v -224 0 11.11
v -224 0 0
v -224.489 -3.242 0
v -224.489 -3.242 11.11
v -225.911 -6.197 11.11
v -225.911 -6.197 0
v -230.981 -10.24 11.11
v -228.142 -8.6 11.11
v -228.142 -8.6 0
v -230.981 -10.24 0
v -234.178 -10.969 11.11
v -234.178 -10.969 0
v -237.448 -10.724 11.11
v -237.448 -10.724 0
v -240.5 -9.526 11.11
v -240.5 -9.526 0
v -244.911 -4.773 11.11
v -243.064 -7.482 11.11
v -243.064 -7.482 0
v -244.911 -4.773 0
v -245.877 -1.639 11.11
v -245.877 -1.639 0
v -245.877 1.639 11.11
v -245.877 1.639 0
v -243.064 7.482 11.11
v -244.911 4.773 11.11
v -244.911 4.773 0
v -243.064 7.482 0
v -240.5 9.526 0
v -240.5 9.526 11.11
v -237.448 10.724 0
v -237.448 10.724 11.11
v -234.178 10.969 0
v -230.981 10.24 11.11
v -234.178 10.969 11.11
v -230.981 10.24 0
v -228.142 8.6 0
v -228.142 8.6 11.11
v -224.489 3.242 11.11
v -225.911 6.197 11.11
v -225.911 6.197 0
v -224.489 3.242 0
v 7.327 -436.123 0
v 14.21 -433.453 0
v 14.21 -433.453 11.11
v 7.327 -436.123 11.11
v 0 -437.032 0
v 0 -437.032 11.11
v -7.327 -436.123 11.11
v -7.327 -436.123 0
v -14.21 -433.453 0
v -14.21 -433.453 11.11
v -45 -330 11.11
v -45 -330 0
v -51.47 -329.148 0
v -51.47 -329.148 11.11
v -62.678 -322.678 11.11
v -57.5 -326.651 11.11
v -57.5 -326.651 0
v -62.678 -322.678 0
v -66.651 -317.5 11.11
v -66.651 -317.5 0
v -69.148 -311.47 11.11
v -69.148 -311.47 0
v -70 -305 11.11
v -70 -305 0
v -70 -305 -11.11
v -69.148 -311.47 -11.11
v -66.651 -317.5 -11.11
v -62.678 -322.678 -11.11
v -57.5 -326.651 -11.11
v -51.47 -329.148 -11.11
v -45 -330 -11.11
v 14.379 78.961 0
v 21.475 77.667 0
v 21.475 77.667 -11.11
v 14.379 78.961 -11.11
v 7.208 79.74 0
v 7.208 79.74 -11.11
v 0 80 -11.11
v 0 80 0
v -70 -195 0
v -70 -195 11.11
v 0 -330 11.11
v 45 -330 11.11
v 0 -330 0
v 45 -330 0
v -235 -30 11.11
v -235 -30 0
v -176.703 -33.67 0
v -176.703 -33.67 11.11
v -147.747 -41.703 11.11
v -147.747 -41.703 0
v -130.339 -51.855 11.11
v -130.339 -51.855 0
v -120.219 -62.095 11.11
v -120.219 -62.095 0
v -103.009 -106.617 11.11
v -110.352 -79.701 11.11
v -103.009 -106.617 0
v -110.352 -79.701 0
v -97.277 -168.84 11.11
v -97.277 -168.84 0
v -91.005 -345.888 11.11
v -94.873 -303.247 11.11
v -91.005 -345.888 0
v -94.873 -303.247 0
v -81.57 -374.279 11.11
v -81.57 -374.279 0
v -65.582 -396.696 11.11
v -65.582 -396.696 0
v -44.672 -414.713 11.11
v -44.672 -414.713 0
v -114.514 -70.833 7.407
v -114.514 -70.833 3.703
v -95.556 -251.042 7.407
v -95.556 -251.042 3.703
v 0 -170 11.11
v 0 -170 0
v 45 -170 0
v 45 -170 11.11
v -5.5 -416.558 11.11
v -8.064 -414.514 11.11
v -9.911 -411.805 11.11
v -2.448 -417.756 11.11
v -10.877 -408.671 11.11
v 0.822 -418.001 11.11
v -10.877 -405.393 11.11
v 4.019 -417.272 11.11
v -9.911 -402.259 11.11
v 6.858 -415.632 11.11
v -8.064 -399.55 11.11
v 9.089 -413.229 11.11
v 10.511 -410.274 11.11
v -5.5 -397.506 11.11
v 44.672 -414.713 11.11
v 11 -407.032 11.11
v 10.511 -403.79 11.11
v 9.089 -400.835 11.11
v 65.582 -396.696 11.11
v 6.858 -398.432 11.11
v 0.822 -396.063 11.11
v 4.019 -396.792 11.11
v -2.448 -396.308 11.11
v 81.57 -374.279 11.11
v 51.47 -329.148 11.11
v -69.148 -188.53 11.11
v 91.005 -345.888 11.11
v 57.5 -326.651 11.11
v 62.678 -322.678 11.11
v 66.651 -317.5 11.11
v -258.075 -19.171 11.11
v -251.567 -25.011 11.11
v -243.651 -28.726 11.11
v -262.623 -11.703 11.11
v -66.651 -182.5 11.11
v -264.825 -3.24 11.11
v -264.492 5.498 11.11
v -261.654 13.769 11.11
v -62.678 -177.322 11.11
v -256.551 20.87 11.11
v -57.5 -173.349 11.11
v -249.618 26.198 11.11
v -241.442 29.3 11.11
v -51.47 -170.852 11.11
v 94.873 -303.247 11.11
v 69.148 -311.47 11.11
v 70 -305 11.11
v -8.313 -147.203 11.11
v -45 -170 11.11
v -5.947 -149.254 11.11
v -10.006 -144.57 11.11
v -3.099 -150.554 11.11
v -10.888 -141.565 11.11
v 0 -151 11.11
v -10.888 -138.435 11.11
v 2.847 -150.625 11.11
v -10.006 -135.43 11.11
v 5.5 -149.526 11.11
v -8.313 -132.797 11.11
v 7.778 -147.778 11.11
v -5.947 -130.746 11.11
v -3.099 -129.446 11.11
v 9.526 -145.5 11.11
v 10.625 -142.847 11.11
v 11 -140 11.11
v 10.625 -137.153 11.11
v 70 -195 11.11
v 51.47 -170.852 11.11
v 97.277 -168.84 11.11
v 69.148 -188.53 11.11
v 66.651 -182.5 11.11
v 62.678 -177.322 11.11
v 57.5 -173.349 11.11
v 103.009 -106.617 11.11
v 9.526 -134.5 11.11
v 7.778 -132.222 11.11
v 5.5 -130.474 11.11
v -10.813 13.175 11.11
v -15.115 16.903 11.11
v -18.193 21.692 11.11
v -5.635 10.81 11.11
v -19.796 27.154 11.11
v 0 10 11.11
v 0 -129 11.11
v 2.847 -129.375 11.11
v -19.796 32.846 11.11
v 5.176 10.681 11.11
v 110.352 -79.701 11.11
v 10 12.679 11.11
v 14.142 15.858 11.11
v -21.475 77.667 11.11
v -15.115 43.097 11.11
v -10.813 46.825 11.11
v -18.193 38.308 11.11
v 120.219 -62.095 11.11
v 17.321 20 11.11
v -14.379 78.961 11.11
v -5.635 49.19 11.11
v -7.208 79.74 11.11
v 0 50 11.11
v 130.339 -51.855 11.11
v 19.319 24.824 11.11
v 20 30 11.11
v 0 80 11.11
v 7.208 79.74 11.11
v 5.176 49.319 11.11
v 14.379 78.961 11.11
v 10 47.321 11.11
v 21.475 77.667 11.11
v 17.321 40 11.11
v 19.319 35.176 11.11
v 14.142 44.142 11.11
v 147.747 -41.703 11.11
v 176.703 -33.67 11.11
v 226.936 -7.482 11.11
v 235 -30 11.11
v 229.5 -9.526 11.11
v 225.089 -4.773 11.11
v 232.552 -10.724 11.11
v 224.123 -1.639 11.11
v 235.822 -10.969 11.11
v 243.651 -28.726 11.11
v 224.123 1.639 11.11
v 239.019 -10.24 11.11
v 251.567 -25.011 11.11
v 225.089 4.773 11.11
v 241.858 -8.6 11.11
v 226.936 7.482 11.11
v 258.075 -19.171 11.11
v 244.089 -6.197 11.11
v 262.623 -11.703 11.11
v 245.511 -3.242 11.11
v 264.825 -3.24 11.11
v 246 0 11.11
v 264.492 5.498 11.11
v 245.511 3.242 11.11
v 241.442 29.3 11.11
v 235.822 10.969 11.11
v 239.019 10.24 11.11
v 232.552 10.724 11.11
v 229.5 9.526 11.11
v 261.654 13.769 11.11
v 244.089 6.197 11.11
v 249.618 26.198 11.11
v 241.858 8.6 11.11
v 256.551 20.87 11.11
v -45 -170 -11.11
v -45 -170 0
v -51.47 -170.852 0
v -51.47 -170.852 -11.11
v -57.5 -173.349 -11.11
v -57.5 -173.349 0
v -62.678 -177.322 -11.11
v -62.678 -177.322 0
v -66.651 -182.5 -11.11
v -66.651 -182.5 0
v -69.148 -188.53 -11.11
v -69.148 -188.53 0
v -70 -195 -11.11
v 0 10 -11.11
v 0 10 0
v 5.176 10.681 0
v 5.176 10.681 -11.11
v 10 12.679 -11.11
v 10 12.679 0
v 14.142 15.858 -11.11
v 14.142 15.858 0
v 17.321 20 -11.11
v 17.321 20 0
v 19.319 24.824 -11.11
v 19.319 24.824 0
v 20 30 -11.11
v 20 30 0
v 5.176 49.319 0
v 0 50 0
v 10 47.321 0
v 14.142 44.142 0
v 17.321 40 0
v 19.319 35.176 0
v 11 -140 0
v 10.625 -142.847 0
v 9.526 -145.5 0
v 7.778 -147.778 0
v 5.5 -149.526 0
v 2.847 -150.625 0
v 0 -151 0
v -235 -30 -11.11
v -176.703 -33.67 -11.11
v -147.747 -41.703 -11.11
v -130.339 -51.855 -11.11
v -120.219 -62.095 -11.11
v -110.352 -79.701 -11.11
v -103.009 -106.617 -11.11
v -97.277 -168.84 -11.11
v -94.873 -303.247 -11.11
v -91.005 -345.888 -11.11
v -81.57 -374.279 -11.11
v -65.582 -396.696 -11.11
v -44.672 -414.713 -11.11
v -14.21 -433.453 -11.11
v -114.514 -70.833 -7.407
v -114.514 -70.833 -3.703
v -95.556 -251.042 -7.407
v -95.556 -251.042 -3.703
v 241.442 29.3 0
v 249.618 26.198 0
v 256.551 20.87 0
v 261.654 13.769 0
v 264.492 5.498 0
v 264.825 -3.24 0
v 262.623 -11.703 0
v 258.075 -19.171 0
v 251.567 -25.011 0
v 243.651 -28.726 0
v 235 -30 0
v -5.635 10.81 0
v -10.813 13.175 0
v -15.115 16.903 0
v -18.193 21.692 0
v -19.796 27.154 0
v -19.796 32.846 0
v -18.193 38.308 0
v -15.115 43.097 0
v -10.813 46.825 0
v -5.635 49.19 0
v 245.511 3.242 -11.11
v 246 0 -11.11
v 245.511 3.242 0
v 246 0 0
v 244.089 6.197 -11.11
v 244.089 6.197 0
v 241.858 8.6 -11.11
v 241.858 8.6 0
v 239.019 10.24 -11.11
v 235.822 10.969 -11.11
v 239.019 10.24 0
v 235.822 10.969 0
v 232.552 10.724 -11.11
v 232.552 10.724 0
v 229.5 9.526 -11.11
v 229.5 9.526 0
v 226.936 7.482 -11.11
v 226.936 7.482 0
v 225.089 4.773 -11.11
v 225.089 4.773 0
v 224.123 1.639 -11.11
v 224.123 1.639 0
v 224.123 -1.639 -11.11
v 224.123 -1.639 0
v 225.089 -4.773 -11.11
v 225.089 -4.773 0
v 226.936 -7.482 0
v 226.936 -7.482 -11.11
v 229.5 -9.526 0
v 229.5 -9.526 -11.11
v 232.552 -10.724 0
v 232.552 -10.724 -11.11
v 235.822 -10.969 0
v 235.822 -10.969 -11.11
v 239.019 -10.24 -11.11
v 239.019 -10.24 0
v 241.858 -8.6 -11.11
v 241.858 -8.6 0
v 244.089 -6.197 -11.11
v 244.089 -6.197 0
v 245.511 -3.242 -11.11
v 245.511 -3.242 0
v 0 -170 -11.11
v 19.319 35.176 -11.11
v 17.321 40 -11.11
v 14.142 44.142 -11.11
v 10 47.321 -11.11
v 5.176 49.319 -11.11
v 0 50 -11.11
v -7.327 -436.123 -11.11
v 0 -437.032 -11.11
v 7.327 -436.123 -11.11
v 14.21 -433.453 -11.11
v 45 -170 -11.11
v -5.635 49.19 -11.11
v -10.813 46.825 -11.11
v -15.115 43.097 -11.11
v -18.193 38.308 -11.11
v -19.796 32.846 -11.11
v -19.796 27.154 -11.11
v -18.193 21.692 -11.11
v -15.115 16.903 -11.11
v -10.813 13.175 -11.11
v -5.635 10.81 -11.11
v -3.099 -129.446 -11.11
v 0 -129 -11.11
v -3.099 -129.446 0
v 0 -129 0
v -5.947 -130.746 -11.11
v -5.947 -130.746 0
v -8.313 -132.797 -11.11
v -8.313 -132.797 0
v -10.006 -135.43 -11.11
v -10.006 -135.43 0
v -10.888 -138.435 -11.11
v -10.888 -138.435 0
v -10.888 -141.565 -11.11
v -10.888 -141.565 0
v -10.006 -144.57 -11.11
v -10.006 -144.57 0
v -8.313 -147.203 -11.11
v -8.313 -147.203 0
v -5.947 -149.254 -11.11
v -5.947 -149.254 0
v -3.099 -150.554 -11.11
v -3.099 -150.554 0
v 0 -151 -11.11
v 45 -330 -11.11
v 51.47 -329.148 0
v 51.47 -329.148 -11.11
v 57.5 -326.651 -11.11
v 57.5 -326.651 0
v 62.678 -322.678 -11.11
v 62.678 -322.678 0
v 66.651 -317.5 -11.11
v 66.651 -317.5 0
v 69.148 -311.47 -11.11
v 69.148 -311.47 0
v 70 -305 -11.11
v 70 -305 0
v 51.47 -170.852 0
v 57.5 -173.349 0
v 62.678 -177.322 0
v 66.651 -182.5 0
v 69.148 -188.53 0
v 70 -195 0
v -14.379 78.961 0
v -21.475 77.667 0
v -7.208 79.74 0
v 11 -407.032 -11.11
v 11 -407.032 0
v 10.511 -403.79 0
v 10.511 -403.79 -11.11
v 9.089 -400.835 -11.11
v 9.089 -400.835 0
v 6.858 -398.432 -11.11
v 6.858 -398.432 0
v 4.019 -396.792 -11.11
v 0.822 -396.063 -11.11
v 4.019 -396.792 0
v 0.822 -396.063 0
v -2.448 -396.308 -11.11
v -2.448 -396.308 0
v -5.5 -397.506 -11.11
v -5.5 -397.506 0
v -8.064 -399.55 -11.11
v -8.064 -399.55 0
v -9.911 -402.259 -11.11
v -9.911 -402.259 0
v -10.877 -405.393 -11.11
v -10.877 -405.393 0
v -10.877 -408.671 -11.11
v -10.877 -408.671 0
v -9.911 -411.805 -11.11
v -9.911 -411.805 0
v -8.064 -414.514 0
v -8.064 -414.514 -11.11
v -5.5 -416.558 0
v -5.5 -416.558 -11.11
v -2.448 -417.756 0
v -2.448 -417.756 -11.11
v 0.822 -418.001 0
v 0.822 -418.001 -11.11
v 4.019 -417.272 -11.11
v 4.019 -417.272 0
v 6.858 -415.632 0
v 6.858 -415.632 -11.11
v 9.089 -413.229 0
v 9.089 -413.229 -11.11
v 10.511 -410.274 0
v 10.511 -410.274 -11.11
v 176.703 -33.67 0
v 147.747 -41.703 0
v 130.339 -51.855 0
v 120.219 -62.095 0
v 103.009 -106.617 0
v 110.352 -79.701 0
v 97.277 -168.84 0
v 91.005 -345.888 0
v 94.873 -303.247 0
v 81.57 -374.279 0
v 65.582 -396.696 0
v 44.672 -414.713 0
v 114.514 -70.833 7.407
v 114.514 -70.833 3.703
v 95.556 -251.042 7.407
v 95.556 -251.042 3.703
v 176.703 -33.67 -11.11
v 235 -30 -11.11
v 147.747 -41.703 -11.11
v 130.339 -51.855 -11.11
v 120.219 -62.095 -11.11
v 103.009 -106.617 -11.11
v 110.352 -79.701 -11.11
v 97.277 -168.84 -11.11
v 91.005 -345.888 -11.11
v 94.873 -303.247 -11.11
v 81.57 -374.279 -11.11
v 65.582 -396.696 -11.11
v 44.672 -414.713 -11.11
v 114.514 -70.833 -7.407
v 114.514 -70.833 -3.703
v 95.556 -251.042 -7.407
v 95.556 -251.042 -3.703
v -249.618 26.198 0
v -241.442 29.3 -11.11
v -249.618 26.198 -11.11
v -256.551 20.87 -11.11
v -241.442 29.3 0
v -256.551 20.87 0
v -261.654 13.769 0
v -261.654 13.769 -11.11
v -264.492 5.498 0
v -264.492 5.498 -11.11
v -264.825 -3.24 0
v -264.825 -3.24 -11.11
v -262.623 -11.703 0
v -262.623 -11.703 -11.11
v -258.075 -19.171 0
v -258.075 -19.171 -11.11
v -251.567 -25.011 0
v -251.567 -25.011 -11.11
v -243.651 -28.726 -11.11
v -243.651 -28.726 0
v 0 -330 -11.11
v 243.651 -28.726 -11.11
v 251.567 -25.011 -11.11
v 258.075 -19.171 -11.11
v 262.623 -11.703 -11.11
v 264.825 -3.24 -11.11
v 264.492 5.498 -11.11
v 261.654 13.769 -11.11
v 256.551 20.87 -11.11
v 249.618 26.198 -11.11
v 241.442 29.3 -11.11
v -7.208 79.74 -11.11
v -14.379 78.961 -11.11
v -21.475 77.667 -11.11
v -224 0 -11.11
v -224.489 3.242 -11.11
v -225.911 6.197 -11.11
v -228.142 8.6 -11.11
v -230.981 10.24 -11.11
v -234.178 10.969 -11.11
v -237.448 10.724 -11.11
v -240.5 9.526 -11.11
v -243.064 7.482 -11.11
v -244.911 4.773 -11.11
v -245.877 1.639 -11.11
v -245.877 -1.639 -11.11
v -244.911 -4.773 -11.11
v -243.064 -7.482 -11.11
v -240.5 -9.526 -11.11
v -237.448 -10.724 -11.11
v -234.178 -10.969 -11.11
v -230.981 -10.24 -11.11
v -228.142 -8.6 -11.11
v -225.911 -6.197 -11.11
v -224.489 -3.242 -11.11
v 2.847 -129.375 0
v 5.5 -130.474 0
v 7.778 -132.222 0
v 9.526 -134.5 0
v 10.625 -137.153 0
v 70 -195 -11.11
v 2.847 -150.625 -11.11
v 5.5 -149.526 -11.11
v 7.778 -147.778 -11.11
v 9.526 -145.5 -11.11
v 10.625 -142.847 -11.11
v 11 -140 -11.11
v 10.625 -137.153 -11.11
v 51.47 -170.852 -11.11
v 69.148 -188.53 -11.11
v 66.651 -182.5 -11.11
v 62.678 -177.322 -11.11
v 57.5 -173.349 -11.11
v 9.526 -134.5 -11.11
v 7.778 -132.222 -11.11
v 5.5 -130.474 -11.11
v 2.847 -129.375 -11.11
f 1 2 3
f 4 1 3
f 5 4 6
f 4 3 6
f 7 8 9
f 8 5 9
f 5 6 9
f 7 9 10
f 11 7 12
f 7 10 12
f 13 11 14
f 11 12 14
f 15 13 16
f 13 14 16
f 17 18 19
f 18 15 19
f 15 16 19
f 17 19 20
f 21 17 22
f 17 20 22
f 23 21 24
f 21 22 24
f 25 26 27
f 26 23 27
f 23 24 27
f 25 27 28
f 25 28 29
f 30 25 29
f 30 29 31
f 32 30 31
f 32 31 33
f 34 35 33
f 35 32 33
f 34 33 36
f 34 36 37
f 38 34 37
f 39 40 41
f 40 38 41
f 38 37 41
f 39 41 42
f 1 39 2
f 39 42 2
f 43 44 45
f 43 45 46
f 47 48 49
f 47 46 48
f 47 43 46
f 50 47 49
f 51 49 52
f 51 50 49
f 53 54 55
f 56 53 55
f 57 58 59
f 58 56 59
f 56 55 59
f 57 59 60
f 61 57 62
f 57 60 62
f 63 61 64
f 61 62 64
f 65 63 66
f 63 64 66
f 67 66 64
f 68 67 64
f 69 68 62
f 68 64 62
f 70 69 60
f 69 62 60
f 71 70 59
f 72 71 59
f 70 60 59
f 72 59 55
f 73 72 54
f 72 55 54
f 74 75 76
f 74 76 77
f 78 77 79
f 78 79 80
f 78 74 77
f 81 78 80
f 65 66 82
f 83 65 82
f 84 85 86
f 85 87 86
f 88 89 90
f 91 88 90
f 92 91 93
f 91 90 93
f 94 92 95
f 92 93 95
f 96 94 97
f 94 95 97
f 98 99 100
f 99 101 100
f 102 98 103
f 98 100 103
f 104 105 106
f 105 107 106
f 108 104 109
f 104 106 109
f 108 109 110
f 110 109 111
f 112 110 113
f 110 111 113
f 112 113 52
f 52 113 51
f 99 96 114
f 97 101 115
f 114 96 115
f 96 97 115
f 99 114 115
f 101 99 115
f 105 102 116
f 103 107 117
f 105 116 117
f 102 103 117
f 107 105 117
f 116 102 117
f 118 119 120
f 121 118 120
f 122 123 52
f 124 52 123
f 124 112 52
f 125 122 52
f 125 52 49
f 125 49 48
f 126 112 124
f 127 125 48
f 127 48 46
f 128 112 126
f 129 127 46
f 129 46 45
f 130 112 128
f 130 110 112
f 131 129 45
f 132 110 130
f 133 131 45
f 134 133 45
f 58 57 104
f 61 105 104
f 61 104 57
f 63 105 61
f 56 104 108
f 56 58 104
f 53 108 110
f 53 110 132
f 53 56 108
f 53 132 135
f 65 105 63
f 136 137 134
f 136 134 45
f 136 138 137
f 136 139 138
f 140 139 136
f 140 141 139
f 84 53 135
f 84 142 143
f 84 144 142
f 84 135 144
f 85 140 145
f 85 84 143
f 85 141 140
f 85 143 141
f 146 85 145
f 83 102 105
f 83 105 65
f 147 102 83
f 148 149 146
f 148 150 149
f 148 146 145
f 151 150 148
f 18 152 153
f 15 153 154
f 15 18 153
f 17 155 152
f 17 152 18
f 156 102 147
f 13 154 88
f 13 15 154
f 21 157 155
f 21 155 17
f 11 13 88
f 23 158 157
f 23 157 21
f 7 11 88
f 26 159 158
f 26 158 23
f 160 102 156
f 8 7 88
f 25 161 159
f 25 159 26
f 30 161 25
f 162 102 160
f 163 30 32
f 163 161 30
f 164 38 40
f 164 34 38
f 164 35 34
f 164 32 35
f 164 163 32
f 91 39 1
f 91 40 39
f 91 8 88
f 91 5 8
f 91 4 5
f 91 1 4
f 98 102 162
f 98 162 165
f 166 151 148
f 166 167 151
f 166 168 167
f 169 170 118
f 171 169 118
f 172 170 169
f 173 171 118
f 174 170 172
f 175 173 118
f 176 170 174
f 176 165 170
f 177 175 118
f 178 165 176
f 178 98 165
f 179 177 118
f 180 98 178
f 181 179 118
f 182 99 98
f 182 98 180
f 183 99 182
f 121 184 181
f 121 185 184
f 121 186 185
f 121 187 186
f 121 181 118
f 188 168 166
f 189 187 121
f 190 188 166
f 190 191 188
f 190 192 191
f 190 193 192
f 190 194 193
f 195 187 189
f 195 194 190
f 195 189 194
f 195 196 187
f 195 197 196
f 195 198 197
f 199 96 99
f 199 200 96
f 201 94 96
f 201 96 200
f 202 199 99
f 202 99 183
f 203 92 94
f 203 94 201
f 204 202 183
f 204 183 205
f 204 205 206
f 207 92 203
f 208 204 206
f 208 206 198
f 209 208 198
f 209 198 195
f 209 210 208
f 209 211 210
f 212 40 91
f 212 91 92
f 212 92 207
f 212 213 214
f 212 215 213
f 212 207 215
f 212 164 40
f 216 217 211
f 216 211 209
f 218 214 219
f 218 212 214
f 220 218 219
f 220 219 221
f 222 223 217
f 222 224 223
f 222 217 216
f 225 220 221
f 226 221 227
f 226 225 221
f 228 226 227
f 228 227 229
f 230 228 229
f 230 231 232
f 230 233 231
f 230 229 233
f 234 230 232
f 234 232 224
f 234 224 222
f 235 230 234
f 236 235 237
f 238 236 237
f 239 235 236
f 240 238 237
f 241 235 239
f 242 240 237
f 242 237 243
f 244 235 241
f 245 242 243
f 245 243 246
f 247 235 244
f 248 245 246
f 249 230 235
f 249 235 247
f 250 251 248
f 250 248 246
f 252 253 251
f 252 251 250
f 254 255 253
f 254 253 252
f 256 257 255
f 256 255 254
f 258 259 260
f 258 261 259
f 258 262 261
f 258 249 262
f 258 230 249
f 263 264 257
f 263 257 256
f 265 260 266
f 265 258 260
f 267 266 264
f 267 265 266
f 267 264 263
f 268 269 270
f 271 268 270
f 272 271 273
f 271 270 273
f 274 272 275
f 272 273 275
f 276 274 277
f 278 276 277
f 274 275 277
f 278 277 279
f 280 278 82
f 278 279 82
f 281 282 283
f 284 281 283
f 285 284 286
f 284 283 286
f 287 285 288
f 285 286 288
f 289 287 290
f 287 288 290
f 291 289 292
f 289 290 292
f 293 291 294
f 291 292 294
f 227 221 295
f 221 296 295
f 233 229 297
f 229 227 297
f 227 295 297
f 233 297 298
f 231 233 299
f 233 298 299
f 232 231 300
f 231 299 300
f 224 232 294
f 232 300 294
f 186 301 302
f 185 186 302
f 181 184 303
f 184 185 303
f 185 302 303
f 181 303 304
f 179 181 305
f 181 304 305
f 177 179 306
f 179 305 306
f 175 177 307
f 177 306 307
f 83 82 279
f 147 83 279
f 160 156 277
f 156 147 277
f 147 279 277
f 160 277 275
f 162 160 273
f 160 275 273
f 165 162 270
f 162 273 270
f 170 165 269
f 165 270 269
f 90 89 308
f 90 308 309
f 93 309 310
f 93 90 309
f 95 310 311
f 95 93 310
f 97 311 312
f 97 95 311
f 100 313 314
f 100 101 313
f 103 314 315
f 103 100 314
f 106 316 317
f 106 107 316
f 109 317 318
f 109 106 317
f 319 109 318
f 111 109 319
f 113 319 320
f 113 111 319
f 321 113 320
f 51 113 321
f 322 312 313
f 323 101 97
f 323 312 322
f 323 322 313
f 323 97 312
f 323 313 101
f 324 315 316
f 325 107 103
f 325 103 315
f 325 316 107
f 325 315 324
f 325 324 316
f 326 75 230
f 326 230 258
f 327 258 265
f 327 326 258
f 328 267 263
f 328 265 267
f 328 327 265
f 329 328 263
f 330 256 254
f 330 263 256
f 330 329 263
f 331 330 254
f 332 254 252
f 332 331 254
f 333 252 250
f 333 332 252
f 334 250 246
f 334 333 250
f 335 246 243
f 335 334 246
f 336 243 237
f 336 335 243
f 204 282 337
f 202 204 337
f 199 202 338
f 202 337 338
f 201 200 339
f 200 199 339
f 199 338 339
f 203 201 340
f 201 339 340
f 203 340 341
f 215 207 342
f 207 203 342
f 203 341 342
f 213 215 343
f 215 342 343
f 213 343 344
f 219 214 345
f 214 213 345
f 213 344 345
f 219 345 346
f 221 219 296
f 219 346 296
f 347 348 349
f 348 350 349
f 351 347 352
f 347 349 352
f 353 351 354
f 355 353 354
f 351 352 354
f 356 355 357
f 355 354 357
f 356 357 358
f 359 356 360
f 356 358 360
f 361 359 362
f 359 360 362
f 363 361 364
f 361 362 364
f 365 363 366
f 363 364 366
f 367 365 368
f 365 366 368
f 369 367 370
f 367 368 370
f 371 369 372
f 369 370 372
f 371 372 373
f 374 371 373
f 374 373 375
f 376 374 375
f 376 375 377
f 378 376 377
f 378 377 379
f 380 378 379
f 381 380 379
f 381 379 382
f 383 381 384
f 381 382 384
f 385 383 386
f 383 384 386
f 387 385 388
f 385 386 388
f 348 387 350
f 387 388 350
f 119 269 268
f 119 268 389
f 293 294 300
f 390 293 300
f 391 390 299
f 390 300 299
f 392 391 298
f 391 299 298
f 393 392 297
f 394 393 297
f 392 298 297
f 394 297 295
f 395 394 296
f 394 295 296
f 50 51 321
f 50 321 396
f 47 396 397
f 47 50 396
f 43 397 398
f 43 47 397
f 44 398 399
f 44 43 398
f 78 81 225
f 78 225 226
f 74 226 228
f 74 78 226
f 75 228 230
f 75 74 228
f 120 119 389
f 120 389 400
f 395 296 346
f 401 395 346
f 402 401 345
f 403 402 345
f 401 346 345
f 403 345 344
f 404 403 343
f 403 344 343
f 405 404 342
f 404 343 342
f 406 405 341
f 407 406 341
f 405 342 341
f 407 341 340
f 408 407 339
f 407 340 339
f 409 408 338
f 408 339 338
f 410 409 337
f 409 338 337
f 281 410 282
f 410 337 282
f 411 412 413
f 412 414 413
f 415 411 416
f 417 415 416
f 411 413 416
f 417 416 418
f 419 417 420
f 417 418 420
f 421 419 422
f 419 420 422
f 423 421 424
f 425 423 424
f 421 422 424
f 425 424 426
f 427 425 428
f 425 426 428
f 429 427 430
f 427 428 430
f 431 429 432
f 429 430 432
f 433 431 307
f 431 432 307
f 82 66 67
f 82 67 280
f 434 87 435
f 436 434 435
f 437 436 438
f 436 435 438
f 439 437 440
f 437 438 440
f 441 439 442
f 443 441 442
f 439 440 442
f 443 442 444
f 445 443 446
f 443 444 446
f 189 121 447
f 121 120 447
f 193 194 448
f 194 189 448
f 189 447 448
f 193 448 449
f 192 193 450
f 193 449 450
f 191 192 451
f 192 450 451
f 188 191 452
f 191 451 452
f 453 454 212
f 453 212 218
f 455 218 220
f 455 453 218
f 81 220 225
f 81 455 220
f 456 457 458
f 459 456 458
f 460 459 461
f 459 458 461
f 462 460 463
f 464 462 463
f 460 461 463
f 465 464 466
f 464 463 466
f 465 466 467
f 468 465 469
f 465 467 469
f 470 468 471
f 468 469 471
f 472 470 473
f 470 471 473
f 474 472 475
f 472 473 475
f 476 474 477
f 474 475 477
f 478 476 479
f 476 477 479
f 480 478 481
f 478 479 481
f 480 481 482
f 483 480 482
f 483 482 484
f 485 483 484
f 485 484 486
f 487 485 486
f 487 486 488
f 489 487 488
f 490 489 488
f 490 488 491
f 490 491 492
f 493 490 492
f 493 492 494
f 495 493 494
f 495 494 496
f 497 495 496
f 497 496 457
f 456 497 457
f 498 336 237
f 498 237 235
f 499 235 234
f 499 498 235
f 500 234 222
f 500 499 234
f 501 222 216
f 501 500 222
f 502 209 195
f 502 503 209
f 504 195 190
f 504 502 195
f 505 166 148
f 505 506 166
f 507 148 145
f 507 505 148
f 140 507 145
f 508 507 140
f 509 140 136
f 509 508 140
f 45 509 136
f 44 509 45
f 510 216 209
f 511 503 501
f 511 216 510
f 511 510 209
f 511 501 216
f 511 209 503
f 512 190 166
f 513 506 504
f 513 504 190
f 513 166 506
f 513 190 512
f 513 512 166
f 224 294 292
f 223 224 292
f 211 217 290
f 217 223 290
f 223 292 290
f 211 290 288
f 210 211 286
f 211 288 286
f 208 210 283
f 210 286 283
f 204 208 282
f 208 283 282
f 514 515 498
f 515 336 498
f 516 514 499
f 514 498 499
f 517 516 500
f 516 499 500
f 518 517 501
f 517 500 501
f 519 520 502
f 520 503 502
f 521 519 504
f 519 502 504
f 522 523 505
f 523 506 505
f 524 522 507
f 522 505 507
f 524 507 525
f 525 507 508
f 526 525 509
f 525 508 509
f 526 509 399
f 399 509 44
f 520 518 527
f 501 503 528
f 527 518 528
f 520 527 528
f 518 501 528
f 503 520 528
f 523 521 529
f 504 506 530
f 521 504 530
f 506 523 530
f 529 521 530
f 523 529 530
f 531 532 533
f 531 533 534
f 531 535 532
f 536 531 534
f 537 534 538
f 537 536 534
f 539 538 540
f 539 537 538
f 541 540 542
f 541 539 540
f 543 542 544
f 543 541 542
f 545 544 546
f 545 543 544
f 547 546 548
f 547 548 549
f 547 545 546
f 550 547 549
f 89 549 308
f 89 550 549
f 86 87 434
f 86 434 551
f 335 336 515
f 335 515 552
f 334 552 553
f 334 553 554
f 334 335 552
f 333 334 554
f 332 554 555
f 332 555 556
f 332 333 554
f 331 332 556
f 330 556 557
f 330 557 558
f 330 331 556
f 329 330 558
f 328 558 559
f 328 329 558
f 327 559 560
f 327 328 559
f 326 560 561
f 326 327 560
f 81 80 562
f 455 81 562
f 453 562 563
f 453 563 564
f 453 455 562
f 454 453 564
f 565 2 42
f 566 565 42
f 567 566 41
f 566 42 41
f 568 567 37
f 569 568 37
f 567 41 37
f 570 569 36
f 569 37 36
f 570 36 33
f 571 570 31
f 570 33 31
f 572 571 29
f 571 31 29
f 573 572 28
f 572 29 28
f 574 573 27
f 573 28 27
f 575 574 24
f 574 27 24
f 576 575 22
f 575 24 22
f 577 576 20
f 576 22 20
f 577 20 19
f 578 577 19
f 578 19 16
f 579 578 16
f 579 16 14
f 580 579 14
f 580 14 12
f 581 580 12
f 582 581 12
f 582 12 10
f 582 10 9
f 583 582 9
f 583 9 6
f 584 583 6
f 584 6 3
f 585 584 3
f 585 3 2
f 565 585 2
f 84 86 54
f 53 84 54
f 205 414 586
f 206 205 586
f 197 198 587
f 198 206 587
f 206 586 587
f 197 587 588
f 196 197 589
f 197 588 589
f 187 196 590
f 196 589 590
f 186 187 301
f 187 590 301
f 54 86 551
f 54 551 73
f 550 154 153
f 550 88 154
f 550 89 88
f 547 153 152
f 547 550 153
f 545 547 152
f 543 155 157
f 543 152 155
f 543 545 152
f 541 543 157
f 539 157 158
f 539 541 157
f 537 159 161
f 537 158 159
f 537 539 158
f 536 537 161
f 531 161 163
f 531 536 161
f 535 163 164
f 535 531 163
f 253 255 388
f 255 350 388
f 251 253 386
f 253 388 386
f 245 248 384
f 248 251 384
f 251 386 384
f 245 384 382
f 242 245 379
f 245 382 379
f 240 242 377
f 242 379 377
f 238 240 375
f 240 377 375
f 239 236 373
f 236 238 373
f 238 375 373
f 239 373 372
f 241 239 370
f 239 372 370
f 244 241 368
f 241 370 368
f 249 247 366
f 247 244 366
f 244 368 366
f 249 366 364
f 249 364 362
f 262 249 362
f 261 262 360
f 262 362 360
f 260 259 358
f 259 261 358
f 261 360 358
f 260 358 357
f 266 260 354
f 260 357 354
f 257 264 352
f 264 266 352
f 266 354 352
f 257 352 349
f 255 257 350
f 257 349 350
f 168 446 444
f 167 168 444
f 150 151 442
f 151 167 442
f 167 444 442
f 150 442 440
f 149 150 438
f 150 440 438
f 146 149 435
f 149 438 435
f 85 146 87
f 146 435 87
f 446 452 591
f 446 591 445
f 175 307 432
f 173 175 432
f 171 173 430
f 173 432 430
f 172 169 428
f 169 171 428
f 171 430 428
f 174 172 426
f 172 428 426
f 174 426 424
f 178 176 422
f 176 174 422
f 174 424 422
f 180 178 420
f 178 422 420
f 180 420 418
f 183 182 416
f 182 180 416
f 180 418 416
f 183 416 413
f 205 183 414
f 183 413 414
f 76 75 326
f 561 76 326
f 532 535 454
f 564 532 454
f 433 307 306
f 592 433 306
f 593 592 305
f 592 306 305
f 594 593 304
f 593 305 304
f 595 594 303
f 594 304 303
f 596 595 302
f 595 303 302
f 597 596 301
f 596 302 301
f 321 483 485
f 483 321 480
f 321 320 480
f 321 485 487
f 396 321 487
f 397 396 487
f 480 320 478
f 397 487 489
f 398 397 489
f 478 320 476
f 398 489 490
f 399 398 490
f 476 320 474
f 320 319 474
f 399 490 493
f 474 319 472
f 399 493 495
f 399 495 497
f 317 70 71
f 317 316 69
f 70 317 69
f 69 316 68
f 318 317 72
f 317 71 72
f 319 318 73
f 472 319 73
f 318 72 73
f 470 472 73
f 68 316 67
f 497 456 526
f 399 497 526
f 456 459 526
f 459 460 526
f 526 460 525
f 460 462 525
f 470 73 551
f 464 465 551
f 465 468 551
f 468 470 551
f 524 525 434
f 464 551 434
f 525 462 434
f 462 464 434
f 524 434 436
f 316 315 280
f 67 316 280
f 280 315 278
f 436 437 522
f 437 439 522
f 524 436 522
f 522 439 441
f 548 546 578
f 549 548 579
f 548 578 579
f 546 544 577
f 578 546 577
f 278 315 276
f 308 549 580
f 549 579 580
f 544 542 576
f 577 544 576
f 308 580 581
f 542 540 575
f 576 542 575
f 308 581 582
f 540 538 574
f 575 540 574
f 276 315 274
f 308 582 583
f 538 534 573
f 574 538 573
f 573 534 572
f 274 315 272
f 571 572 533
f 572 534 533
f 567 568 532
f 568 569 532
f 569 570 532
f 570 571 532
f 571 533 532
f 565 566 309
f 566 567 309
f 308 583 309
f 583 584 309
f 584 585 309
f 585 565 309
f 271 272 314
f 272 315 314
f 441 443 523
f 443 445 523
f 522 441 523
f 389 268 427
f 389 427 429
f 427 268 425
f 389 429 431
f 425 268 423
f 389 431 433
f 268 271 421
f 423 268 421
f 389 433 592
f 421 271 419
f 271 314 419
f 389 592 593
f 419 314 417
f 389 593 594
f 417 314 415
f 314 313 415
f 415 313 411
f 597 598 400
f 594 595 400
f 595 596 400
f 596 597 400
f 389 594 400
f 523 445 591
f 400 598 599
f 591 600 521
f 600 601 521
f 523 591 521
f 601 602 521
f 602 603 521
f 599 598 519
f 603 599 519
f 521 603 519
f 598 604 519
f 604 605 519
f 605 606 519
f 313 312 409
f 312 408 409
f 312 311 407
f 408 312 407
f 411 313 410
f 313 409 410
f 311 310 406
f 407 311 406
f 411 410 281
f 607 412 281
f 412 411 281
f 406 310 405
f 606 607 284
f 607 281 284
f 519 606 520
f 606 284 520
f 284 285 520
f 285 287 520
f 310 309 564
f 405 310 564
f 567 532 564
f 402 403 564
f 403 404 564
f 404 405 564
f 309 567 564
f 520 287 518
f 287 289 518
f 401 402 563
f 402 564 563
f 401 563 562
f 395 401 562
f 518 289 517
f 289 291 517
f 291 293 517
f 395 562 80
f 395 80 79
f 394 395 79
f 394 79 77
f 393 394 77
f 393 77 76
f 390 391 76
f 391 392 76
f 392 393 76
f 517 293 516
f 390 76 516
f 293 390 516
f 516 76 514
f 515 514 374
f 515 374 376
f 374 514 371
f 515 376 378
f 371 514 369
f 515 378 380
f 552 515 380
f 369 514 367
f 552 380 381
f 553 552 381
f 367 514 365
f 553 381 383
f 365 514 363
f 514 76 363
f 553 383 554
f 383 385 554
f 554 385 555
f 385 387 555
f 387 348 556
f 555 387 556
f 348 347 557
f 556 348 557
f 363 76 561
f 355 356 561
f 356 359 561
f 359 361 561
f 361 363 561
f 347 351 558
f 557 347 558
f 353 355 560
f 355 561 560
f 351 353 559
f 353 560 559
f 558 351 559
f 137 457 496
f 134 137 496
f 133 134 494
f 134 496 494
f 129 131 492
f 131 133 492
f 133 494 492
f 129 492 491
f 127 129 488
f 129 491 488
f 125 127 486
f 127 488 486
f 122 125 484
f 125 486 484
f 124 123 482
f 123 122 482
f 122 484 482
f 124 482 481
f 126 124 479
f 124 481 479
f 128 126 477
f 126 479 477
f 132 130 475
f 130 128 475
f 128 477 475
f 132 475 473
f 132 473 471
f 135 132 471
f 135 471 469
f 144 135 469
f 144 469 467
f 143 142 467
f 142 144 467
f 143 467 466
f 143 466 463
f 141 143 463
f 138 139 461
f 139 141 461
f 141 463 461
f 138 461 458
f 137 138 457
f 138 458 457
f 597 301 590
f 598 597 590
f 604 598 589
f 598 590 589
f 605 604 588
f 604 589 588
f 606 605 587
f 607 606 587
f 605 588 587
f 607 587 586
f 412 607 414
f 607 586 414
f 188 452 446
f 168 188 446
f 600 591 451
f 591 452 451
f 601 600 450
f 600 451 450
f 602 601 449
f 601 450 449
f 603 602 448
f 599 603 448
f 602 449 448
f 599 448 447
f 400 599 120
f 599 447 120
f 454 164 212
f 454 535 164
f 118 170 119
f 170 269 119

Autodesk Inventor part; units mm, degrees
ref_plane "YZ Plane" through (0, 0, 0) normal (1, 0, 0) x (0, 1, 0)
ref_plane "XZ Plane" through (0, 0, 0) normal (0, 1, 0) x (-1, 0, 0)
ref_plane "XY Plane" through (0, 0, 0) normal (0, 0, 1) x (1, 0, 0)
sketch "Sketch2" plane through (0, 0, 0) normal (0, 0, 1) x (1, 0, 0)
  circle A0 centre (-235, 0) radius 11
  circle A1 centre (235, 0) radius 11
  circle A2 centre (0, -407.032) radius 11
  line L0 (0, -130) -> (0, -100) construction
  line L1 (0, 0) -> (0, 30) construction
  circle A3 centre (0, 30) radius 20
  line L2 (0, 201.7397) -> (0, -386.4818)
  line L3 (-241.4425, 29.3001) -> (-21.4752, 77.6669)
  arc A4 (21.4752, 77.6669) -> (-21.4752, 77.6669) centre (0, -20) ccw
  line L4 (21.4752, 77.6669) -> (241.4425, 29.3001)
  circle A5 centre (0, -140) radius 11
  line L5 (-45, -170) -> (45, -170)
  line L6 (70, -195) -> (70, -305)
  line L7 (45, -330) -> (-45, -330)
  line L8 (-70, -305) -> (-70, -195)
  arc A6 (-14.2105, -433.4528) -> (14.2105, -433.4528) centre (0, -407.032) ccw
  arc A7 (235, -30) -> (241.4425, 29.3001) centre (235, 0) ccw
  arc A8 (-241.4425, 29.3001) -> (-235, -30) centre (-235, 0) ccw
  line L9 (-235, -30) -> (-210, -30) construction
  line L10 (-210, -30) -> (-105, -30) construction
  line L11 (-105, -30) -> (-95, -110) construction
  line L12 (-95, -110) -> (-95, -325) construction
  line L13 (-95, -325) -> (-95, -390) construction
  line L14 (-95, -390) -> (-14.2105, -433.4528) construction
  spline S0 degree 4 poles (-235, -30) (-210, -30) (-105, -30) (-95, -110) (-95, -325) (-95, -390) (-14.2105, -433.4528) knots 1 1 1 1 1 2 3 4 4 4 4 4
  arc A9 (-45, -170) -> (-70, -195) centre (-45, -195) ccw
  arc A10 (70, -195) -> (45, -170) centre (45, -195) ccw
  arc A11 (45, -330) -> (70, -305) centre (45, -305) ccw
  arc A12 (-70, -305) -> (-45, -330) centre (-45, -305) ccw
  line L15 (235, -30) -> (210, -30) construction
  line L16 (210, -30) -> (105, -30) construction
  line L17 (105, -30) -> (95, -110) construction
  line L18 (95, -110) -> (95, -325) construction
  line L19 (95, -325) -> (95, -390) construction
  line L20 (95, -390) -> (14.2105, -433.4528) construction
  spline S1 degree 4 poles (235, -30) (210, -30) (105, -30) (95, -110) (95, -325) (95, -390) (14.2105, -433.4528) knots 1 1 1 1 1 2 3 4 4 4 4 4
  point P0 (-17.2975, -383.8099)
  point P1 (-17.2975, -383.8099)
  point P2 (70, -330)
  point P3 (70, -170)
  point P4 (-70, -330)
  dimension "d24" = 22
  dimension "d25" = 22
  dimension "d31" = 22
  dimension "d32" = 407.032
  dimension "d33" = 0
  dimension "d44" = 30
  dimension "d46" = 40
  dimension "d59" = 22
  dimension "d60" = 140
  dimension "d61" = 140
  dimension "d62" = 160
  dimension "d63" = 30
  dimension "d64" = 60
  dimension "d65" = 60
  dimension "d66" = 60
  dimension "d67" = 25
  dimension "d68" = 100
  dimension "d69" = 20
  dimension "d72" = 470
  dimension "d75" = 25
  dimension "d76" = 30
  dimension "d77" = 190
  dimension "d78" = 210
  dimension "d79" = 30
  dimension "d80" = 80
  dimension "d81" = 215
  dimension "d82" = 65
extrude "Extrusion1" add sketch "Sketch2" along normal mid plane 22.22
properties part number "Corpo_Suporte_4_Cabos_Modelo4"
